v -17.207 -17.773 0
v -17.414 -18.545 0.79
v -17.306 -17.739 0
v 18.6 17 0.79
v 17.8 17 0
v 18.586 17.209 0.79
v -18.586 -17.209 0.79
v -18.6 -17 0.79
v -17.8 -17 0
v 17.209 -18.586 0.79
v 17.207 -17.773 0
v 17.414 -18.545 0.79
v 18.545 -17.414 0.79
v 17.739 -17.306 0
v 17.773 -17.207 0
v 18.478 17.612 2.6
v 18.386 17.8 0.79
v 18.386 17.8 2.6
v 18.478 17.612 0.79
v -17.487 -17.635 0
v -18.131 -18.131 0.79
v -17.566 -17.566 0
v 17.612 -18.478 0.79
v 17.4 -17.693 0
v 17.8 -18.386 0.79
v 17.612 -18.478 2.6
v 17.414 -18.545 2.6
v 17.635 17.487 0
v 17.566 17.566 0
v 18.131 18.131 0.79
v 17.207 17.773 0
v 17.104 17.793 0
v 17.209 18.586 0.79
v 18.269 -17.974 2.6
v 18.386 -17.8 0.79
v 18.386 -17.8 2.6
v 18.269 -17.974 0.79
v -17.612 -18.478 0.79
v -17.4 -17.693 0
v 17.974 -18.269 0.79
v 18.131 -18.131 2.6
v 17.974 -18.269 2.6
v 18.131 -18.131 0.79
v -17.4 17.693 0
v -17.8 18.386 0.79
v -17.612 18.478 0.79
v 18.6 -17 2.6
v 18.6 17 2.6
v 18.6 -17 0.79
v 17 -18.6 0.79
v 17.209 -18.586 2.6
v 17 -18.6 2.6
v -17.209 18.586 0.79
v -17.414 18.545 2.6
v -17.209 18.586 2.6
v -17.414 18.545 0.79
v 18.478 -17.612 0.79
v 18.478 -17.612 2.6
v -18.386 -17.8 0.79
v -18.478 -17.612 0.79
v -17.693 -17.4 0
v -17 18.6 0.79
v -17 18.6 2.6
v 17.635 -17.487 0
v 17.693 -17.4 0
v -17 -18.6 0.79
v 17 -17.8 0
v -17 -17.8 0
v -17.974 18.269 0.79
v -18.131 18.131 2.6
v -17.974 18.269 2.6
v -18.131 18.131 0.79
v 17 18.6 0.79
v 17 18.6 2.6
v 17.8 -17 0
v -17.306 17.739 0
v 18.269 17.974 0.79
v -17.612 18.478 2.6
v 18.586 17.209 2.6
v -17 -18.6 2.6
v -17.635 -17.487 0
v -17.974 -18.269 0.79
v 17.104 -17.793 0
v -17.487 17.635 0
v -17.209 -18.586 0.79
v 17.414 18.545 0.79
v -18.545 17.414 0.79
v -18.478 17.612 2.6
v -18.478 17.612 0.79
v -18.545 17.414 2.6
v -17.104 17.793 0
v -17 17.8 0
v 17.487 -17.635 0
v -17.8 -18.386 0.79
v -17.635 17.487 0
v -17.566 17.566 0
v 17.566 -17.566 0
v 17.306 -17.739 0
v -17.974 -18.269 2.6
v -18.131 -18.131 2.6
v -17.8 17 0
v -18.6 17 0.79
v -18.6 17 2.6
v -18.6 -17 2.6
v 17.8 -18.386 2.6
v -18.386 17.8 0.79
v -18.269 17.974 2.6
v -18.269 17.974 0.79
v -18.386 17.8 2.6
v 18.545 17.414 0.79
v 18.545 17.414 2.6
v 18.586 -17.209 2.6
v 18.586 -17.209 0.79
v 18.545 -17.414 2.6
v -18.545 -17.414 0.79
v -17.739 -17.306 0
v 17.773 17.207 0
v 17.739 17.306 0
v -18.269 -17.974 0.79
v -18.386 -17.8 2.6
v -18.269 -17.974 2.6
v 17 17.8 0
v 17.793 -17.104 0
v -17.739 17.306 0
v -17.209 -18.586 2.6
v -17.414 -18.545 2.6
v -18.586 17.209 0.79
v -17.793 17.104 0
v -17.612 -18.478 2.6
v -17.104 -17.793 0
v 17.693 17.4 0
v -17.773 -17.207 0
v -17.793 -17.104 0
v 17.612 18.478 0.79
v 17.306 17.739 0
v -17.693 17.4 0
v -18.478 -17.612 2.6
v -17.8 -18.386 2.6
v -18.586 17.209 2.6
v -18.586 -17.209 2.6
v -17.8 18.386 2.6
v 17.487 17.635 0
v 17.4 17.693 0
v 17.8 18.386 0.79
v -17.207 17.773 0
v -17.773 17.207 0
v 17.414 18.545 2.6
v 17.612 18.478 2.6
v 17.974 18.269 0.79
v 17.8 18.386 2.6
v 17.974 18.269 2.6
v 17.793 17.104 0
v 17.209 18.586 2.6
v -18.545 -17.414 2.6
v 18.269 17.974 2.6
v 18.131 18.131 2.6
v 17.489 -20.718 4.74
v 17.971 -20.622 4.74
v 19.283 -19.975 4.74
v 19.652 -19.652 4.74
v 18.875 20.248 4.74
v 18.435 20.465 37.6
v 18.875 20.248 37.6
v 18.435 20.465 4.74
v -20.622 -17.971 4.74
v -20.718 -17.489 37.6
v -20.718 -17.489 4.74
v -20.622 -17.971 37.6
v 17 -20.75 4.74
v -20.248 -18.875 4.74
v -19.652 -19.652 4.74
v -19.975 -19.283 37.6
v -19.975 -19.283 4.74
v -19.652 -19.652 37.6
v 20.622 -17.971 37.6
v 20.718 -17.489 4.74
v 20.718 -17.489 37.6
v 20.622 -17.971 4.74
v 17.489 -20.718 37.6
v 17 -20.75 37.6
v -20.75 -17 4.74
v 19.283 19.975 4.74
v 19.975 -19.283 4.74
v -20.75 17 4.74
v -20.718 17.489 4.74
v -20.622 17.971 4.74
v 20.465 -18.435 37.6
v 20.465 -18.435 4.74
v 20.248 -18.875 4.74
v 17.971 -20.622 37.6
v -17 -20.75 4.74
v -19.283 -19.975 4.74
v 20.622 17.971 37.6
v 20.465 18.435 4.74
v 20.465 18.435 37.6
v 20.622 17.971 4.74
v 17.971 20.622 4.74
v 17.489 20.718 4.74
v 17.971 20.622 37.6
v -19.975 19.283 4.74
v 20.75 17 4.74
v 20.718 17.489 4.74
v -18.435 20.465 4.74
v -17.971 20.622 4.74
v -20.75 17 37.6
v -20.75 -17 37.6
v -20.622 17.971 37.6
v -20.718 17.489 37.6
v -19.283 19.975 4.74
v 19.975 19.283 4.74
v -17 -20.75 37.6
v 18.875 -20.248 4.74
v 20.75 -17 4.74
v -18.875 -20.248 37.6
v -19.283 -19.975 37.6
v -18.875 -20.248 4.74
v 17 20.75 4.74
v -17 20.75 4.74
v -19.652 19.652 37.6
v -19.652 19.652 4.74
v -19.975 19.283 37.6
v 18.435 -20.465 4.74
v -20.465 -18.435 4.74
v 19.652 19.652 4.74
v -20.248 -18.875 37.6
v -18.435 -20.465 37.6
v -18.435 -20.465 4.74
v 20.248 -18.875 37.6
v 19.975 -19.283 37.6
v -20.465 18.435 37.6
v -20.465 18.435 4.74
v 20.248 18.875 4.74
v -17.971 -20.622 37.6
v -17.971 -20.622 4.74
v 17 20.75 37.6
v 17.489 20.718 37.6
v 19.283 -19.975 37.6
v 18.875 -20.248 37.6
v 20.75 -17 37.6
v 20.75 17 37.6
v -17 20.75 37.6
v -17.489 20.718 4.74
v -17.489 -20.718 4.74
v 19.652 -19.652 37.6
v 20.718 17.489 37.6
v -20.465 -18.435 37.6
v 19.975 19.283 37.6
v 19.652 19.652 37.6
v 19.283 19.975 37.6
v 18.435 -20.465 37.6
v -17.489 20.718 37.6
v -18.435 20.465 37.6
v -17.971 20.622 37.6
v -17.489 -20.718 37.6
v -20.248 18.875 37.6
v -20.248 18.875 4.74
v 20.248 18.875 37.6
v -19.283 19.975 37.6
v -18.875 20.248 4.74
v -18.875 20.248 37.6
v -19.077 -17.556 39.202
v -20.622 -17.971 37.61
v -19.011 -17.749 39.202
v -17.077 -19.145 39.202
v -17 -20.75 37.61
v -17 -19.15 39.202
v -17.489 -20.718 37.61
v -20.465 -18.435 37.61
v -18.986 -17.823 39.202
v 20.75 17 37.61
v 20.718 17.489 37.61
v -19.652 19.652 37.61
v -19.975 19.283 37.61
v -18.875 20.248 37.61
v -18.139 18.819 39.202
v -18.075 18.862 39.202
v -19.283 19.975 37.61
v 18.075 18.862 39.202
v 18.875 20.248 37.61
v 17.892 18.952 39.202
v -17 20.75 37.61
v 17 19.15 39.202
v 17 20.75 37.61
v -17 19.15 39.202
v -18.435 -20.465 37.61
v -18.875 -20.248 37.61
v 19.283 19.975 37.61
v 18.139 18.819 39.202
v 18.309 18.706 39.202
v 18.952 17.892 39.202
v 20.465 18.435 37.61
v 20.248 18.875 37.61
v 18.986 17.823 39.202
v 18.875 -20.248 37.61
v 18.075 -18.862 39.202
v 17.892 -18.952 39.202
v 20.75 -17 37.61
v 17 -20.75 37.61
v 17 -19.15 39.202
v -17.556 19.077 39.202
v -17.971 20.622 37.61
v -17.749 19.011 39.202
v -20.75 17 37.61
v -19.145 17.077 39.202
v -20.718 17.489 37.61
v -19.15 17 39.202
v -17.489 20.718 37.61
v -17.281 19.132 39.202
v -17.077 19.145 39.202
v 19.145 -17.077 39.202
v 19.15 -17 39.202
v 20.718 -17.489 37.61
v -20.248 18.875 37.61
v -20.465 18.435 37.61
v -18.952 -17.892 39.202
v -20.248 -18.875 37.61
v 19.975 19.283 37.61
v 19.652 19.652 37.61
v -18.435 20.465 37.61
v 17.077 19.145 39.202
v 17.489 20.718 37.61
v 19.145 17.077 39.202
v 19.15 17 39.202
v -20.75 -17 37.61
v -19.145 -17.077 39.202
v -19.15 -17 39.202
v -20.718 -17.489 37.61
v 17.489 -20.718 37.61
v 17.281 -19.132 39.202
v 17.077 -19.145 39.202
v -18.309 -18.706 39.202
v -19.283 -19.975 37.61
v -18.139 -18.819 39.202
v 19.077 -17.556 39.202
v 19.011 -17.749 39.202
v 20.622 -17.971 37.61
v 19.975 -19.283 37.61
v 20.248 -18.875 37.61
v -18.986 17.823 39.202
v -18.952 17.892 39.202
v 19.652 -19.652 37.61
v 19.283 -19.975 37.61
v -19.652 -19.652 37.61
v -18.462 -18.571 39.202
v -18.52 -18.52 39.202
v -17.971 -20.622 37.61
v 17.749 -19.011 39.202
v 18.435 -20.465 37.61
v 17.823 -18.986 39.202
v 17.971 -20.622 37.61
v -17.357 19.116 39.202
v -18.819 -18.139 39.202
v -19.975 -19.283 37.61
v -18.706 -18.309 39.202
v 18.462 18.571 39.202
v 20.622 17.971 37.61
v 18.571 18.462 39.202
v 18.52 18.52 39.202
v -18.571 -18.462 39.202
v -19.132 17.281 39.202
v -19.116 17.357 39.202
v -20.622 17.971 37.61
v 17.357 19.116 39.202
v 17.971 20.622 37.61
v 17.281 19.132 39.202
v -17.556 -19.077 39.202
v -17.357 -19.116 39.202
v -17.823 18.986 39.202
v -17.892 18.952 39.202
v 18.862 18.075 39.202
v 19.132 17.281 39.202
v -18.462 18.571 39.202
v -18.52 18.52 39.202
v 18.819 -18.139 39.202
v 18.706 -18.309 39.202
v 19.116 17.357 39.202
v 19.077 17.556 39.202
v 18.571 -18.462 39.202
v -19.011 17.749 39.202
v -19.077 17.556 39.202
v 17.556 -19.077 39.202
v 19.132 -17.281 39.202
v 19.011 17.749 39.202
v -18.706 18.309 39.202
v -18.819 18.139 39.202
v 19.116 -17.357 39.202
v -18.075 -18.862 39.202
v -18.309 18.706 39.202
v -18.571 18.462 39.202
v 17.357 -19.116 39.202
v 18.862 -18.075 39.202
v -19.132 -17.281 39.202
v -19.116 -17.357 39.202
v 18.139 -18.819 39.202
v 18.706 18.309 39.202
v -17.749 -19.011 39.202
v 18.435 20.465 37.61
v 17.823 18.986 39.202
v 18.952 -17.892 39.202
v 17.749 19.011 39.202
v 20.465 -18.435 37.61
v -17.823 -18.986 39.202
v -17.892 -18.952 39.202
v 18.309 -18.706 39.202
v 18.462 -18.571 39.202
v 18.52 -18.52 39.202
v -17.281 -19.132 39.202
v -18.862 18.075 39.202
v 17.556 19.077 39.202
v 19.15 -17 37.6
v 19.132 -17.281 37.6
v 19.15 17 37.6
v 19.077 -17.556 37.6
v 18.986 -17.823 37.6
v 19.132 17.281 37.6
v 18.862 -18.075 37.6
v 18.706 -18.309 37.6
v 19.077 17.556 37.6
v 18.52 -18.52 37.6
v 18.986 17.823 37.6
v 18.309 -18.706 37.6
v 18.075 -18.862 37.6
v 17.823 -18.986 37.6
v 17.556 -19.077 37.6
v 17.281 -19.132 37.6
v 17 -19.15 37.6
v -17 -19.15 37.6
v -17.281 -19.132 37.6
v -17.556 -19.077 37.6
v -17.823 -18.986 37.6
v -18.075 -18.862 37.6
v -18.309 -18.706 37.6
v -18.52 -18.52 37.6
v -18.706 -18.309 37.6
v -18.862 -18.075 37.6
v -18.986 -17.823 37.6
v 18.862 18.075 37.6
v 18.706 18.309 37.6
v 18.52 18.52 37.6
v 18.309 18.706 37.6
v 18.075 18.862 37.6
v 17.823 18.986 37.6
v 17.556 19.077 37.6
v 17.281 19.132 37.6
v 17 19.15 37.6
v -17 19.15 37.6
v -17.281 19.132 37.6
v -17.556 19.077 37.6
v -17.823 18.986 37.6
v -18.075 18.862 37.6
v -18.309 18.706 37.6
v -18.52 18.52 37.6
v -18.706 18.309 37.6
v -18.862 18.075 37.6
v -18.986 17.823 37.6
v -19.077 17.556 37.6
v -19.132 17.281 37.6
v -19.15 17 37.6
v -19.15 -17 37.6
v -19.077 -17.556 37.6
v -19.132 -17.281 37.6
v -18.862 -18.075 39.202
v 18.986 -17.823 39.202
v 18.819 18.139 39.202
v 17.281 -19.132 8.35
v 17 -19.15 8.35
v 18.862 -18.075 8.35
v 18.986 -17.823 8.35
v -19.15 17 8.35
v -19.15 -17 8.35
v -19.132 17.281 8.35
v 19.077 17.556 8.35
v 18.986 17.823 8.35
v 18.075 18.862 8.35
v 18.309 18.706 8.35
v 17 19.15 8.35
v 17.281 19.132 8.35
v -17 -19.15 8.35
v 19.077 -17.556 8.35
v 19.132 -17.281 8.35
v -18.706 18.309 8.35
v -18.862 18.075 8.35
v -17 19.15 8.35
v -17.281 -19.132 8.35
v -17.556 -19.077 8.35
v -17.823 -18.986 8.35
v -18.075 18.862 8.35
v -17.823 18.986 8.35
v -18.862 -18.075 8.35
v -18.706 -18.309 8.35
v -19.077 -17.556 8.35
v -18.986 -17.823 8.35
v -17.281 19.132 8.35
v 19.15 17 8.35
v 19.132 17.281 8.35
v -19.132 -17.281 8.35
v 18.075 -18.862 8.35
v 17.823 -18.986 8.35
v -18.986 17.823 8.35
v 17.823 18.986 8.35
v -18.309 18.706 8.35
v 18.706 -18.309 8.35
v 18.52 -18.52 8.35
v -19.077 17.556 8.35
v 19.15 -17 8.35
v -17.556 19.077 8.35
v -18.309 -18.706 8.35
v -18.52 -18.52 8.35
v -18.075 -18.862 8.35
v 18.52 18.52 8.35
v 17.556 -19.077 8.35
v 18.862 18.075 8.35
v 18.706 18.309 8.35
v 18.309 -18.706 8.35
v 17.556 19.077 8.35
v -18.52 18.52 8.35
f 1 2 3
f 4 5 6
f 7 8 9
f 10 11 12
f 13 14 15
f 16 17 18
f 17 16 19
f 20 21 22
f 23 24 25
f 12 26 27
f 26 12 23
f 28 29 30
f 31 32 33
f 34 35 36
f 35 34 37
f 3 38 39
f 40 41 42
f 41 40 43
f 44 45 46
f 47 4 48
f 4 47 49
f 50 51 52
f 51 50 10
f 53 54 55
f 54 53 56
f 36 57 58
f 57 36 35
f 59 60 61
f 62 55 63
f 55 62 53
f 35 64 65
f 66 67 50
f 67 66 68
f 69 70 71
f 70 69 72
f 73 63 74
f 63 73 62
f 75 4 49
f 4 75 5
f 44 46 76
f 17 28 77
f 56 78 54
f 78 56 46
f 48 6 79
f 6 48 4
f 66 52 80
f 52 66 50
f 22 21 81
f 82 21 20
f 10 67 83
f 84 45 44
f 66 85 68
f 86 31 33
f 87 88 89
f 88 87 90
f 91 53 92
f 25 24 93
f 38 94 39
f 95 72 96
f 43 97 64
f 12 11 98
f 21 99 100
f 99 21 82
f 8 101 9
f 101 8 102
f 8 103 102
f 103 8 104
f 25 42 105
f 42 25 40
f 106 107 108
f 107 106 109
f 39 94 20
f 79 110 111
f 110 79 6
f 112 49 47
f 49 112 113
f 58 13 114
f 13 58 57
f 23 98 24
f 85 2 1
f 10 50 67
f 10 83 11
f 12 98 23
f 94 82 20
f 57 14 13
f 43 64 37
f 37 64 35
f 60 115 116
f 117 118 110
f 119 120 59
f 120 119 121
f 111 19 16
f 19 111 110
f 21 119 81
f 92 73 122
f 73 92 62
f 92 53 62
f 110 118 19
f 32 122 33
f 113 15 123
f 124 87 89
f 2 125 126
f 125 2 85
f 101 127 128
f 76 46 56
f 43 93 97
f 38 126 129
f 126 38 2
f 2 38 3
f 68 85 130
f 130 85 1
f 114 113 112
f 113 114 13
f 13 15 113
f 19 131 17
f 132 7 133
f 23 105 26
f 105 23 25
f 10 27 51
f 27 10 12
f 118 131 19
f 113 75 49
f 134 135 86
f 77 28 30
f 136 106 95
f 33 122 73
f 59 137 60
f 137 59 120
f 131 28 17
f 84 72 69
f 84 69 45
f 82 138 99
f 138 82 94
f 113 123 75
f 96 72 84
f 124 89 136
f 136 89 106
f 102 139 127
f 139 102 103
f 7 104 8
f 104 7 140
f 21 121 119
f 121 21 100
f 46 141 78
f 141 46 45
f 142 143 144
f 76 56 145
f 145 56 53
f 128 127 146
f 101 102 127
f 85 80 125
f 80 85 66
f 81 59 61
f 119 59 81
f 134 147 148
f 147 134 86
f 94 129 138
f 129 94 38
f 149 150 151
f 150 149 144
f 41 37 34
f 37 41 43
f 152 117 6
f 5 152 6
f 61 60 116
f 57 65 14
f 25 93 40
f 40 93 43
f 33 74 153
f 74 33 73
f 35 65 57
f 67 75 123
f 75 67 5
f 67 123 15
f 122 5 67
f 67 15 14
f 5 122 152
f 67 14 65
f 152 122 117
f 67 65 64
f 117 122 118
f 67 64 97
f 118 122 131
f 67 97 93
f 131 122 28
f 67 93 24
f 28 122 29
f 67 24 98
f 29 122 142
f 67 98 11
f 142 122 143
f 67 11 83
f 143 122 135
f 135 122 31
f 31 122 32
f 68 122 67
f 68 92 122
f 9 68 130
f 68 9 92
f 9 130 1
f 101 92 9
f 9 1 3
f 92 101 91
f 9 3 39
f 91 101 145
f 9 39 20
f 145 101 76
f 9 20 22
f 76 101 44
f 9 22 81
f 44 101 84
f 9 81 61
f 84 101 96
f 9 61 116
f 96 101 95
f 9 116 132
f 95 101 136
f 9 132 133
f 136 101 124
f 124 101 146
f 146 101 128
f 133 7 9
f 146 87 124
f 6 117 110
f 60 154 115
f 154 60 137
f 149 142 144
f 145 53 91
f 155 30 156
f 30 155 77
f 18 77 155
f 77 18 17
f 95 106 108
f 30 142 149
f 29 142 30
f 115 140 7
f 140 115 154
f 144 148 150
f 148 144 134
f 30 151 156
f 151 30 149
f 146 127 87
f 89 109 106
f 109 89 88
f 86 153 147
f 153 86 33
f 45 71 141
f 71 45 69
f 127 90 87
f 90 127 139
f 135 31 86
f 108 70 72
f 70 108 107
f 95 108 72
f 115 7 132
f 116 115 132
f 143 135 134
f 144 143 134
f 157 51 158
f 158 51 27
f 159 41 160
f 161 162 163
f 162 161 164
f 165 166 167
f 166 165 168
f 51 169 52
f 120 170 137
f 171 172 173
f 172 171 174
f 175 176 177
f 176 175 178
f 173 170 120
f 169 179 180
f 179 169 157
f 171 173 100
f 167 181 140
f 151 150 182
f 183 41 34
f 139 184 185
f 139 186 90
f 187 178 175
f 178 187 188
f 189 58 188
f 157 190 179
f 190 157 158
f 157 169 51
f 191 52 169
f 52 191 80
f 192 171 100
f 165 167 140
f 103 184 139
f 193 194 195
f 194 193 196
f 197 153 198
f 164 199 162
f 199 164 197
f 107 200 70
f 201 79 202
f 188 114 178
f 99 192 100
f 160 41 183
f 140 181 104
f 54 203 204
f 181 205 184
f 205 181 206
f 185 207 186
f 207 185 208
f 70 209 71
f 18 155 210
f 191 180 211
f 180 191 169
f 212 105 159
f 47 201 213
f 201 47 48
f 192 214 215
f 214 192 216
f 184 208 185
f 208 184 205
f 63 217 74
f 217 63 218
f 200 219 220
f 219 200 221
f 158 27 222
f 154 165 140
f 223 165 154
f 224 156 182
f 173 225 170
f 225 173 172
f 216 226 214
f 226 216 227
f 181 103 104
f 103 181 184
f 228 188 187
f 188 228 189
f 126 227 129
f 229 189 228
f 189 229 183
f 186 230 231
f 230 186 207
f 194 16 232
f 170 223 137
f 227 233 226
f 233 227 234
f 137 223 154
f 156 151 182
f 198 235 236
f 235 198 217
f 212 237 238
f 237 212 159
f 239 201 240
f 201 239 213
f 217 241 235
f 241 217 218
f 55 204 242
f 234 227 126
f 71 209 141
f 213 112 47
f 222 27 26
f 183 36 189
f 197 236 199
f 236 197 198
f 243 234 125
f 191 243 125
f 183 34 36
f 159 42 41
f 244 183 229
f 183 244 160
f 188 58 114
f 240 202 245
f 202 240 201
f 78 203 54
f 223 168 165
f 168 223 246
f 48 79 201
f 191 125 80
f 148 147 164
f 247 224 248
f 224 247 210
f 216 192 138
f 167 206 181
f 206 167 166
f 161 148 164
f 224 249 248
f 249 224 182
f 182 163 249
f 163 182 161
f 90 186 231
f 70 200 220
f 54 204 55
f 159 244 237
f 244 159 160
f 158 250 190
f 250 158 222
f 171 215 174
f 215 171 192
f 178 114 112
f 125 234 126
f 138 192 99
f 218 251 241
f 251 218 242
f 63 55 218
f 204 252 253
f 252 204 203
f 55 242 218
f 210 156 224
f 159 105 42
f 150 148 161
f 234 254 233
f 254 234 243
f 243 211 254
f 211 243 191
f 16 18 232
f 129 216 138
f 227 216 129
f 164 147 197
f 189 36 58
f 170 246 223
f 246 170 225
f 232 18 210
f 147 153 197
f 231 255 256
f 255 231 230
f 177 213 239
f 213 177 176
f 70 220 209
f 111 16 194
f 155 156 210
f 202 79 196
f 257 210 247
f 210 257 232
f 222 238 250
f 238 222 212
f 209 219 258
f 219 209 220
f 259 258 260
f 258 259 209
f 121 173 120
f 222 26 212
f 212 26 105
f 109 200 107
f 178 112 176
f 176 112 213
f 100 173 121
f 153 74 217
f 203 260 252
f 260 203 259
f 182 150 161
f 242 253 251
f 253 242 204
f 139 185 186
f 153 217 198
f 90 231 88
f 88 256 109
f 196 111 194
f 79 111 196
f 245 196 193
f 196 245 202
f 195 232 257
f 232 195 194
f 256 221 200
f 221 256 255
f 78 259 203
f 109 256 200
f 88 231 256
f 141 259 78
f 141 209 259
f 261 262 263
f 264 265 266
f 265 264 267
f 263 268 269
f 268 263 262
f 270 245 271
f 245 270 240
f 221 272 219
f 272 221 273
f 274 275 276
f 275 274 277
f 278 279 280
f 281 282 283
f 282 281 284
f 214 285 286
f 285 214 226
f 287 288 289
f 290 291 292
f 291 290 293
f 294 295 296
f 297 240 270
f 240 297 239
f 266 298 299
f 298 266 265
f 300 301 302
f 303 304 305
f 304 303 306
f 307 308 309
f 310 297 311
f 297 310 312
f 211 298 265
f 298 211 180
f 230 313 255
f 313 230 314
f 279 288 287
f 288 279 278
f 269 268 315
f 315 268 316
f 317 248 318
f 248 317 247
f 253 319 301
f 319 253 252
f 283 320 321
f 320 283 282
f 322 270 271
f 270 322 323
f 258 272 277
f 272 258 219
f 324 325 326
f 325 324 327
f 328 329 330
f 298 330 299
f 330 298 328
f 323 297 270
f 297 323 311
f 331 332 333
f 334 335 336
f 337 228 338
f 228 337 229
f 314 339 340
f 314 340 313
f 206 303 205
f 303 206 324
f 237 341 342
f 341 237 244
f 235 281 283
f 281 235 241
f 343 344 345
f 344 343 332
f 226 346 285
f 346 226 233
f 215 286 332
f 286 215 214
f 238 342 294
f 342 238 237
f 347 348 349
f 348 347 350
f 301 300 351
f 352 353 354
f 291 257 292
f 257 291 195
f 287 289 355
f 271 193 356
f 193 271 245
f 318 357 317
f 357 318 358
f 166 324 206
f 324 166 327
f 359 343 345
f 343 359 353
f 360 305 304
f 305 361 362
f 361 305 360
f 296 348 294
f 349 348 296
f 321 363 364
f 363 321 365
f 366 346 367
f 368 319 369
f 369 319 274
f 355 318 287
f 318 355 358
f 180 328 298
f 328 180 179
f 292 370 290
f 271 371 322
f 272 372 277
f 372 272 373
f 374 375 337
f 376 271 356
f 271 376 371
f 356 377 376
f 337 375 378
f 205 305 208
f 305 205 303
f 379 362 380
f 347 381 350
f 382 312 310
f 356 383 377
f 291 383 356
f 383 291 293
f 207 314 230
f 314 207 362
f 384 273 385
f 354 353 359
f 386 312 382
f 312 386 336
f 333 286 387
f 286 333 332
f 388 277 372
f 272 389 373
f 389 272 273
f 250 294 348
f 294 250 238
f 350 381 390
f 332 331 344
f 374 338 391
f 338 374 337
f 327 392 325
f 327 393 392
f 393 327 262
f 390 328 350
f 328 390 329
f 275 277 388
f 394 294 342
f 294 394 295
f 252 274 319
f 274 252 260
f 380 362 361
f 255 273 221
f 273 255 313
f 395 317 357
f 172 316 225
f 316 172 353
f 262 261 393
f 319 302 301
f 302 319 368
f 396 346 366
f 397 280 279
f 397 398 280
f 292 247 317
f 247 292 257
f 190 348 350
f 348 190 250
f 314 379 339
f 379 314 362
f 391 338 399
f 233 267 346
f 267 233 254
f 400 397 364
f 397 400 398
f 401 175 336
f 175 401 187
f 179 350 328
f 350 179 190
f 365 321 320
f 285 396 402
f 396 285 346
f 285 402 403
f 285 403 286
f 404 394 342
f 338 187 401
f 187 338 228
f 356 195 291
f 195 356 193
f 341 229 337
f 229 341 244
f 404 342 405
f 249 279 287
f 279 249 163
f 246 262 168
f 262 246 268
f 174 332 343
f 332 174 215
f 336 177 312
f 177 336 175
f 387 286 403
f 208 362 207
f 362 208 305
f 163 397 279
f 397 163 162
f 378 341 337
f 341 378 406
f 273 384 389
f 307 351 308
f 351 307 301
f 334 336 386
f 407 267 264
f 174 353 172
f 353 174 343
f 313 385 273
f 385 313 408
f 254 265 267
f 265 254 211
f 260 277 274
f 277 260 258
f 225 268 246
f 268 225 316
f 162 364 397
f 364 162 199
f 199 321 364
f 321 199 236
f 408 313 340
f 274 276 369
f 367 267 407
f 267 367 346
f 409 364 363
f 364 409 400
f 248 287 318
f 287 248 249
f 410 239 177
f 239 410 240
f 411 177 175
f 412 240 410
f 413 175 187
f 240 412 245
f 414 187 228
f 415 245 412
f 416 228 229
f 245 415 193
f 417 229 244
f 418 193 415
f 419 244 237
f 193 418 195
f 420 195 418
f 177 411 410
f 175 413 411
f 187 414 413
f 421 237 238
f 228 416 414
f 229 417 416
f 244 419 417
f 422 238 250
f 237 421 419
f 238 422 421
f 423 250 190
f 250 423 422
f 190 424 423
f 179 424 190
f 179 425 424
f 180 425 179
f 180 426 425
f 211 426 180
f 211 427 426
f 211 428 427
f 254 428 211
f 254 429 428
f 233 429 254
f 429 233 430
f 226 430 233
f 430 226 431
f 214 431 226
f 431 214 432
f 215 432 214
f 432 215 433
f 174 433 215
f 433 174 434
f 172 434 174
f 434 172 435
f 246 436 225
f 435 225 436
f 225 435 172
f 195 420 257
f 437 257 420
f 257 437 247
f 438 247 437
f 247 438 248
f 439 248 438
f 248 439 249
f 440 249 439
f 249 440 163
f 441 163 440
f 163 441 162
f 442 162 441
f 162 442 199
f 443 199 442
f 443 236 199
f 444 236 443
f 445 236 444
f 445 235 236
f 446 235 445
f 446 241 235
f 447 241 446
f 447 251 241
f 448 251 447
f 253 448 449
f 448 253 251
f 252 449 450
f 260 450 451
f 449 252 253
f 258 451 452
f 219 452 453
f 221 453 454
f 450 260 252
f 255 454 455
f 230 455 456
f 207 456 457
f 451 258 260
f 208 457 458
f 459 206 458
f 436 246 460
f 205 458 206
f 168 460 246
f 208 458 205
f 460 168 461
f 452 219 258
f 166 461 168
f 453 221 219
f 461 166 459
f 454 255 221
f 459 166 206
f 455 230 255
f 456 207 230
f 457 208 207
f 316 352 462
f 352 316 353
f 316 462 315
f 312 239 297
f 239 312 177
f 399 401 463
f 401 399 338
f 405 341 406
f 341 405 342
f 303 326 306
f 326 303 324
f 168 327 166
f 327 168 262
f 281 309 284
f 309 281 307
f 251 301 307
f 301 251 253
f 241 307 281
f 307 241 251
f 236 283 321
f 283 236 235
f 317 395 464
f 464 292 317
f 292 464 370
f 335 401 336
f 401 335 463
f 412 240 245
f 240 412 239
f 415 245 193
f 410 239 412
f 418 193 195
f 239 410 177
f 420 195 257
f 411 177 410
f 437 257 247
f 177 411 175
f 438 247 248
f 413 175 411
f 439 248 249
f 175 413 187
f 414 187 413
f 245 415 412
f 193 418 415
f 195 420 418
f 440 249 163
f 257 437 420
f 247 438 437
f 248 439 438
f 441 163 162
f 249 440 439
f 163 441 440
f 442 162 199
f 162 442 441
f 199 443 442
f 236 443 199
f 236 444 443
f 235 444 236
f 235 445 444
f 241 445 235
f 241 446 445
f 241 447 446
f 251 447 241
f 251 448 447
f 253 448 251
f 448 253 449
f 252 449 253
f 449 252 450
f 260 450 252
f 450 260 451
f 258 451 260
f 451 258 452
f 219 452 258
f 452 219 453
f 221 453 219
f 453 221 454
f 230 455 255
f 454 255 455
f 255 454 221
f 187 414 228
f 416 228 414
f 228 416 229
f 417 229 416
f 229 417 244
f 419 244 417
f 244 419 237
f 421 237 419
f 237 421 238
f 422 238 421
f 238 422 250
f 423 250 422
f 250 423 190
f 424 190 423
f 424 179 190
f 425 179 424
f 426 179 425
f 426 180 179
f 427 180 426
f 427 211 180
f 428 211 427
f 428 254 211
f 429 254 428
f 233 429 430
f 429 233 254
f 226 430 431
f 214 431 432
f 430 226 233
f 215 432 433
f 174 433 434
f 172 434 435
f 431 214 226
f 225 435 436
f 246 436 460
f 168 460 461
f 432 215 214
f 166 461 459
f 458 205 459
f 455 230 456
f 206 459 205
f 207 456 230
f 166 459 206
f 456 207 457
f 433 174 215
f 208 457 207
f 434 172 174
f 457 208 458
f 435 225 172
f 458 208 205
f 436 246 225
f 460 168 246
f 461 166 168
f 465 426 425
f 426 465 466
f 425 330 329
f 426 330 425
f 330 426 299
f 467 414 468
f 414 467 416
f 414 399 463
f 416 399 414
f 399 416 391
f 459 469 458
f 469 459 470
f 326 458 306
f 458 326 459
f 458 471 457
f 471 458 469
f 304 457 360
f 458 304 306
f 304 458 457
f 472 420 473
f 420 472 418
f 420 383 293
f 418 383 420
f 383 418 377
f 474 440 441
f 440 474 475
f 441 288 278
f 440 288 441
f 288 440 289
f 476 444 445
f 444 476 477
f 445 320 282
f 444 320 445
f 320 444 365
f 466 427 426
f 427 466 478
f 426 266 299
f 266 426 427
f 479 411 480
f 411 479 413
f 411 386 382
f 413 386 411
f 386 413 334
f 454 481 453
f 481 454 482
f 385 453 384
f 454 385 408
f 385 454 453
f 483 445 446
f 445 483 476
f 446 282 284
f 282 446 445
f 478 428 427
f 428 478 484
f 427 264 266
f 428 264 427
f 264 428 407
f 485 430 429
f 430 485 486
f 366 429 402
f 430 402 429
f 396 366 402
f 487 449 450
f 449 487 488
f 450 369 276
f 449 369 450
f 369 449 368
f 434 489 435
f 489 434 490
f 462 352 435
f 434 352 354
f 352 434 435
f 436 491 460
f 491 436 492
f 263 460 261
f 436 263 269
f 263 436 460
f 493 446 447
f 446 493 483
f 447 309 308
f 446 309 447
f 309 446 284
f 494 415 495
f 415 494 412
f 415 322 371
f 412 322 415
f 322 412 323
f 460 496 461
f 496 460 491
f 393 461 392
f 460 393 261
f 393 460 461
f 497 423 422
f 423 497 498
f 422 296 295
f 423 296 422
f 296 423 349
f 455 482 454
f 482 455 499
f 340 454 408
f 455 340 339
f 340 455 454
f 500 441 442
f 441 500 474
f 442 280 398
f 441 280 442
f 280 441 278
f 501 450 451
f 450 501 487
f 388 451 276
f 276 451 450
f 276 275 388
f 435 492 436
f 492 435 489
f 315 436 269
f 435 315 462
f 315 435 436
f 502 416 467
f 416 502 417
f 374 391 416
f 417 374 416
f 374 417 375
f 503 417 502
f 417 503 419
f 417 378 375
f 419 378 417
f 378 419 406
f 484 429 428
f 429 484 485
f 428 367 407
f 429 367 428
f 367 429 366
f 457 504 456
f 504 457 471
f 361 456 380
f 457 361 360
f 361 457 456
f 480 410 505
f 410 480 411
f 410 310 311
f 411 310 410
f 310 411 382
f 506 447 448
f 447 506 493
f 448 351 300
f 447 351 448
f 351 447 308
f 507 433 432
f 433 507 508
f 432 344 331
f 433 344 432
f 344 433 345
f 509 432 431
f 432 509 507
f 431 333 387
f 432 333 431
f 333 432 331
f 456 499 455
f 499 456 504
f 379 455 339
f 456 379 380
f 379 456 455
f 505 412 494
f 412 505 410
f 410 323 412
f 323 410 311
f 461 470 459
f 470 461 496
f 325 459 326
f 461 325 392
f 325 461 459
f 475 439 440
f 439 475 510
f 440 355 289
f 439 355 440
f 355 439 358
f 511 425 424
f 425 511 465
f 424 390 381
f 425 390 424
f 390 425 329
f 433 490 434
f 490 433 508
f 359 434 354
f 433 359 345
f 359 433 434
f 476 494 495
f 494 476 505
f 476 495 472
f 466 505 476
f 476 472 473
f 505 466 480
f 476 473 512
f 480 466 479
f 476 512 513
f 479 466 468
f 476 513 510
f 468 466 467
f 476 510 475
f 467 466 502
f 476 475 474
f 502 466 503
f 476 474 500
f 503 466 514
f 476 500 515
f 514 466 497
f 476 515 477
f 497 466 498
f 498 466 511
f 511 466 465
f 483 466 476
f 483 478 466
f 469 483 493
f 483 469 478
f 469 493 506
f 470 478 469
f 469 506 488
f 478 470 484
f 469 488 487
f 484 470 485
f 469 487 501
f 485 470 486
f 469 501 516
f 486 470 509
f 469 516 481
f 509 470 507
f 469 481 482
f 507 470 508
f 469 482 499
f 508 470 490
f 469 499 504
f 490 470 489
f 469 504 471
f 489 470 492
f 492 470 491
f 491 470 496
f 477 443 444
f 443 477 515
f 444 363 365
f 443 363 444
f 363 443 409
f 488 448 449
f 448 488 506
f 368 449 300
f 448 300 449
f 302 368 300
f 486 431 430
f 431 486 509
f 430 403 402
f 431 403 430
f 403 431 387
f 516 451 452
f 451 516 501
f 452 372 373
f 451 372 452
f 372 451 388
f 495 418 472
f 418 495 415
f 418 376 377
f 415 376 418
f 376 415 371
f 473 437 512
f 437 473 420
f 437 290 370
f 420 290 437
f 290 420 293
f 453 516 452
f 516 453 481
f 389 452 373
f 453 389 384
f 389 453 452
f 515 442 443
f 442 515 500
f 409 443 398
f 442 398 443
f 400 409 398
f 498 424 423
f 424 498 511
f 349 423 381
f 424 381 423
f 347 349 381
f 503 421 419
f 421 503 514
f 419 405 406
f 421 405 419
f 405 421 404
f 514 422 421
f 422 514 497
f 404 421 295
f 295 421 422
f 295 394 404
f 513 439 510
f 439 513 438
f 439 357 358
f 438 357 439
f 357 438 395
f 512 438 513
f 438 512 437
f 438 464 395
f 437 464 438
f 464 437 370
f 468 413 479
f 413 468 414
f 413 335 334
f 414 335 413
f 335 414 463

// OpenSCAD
// ============================================================
// Simple Stackable Gridfinity Box  (Customizer-annotated)
// Single compartment. Standard Gridfinity spec: 42mm pitch, 7mm height unit.
// ============================================================

/* [Footprint] */
// cells along X (each 42mm)
grid_x = 1;         // [1:8]
// cells along Y (each 42mm)
grid_y = 1;         // [1:8]
// bin height in 7mm units (6 = 42mm tall)
height_units = 6;   // [2:20]

/* [Walls & Floor] */
// outer wall thickness (mm)
wall = 1.6;             // [0.8:0.1:3]
// solid floor above the base profile (mm)
floor_thickness = 3.6;  // [1.2:0.2:6]

/* [Features] */
// add stacking lip so bins nest when stacked
stacking_lip = true;
// smoothness of curves (higher = smoother, slower)
resolution = 48;    // [24:96]

/* [Hidden] */
$fn = resolution;

// ---------- Gridfinity spec constants ----------
grid_pitch    = 42;
cell_gap      = 0.5;
cell_size     = grid_pitch - cell_gap;   // 41.5
height_unit   = 7;

base_chamfer1 = 0.8;
base_vertical = 1.8;
base_chamfer2 = 2.15;
base_height   = base_chamfer1 + base_vertical + base_chamfer2;  // 4.75

lip_chamfer1  = 0.7;
lip_vertical  = 1.8;
lip_chamfer2  = 1.9;
lip_height    = stacking_lip ? (lip_chamfer1 + lip_vertical + lip_chamfer2) : 0;

corner_r      = 3.75;
outer_x       = grid_x * cell_size;
outer_y       = grid_y * cell_size;
total_height  = height_units * height_unit;

module rounded_rect(sx, sy, r) {
    rc = min(r, min(sx, sy) / 2 - 0.01);
    offset(r = rc) square([sx - 2*rc, sy - 2*rc], center = true);
}

module taper(z0, sx0, sy0, r0, z1, sx1, sy1, r1) {
    hull() {
        translate([0,0,z0]) linear_extrude(0.01) rounded_rect(sx0, sy0, r0);
        translate([0,0,z1-0.01]) linear_extrude(0.01) rounded_rect(sx1, sy1, r1);
    }
}

module base_foot(sx, sy, r) {
    inset = base_chamfer1 + base_chamfer2;
    sm_x = sx - 2*inset; sm_y = sy - 2*inset; sm_r = max(r - inset, 0.5);
    md_x = sx - 2*base_chamfer2; md_y = sy - 2*base_chamfer2; md_r = max(r - base_chamfer2, 0.5);
    taper(0, sm_x, sm_y, sm_r, base_chamfer1, md_x, md_y, md_r);
    taper(base_chamfer1, md_x, md_y, md_r, base_chamfer1+base_vertical, md_x, md_y, md_r);
    taper(base_chamfer1+base_vertical, md_x, md_y, md_r, base_height, sx, sy, r);
}

module lip(sx, sy, r, z) {
    inset = lip_chamfer1 + lip_chamfer2;
    sm_x = sx - 2*inset; sm_y = sy - 2*inset; sm_r = max(r - inset, 0.5);
    md_x = sx - 2*lip_chamfer2; md_y = sy - 2*lip_chamfer2; md_r = max(r - lip_chamfer2, 0.5);
    translate([0,0,z]) {
        taper(0, sx, sy, r, lip_chamfer2, md_x, md_y, md_r);
        taper(lip_chamfer2, md_x, md_y, md_r, lip_chamfer2+lip_vertical, md_x, md_y, md_r);
        taper(lip_chamfer2+lip_vertical, md_x, md_y, md_r, lip_height, sm_x, sm_y, sm_r);
    }
}

module box() {
    difference() {
        union() {
            for (ix = [0:grid_x-1]) for (iy = [0:grid_y-1])
                translate([(ix-(grid_x-1)/2)*grid_pitch, (iy-(grid_y-1)/2)*grid_pitch, 0])
                    base_foot(cell_size, cell_size, corner_r);
            translate([0,0,base_height])
                linear_extrude(total_height - base_height - lip_height)
                    rounded_rect(outer_x, outer_y, corner_r);
            if (stacking_lip) lip(outer_x, outer_y, corner_r, total_height - lip_height);
        }
        translate([0,0,base_height + floor_thickness])
            linear_extrude(total_height)
                rounded_rect(outer_x - 2*wall, outer_y - 2*wall, max(corner_r - wall, 0.5));
    }
}

box();
